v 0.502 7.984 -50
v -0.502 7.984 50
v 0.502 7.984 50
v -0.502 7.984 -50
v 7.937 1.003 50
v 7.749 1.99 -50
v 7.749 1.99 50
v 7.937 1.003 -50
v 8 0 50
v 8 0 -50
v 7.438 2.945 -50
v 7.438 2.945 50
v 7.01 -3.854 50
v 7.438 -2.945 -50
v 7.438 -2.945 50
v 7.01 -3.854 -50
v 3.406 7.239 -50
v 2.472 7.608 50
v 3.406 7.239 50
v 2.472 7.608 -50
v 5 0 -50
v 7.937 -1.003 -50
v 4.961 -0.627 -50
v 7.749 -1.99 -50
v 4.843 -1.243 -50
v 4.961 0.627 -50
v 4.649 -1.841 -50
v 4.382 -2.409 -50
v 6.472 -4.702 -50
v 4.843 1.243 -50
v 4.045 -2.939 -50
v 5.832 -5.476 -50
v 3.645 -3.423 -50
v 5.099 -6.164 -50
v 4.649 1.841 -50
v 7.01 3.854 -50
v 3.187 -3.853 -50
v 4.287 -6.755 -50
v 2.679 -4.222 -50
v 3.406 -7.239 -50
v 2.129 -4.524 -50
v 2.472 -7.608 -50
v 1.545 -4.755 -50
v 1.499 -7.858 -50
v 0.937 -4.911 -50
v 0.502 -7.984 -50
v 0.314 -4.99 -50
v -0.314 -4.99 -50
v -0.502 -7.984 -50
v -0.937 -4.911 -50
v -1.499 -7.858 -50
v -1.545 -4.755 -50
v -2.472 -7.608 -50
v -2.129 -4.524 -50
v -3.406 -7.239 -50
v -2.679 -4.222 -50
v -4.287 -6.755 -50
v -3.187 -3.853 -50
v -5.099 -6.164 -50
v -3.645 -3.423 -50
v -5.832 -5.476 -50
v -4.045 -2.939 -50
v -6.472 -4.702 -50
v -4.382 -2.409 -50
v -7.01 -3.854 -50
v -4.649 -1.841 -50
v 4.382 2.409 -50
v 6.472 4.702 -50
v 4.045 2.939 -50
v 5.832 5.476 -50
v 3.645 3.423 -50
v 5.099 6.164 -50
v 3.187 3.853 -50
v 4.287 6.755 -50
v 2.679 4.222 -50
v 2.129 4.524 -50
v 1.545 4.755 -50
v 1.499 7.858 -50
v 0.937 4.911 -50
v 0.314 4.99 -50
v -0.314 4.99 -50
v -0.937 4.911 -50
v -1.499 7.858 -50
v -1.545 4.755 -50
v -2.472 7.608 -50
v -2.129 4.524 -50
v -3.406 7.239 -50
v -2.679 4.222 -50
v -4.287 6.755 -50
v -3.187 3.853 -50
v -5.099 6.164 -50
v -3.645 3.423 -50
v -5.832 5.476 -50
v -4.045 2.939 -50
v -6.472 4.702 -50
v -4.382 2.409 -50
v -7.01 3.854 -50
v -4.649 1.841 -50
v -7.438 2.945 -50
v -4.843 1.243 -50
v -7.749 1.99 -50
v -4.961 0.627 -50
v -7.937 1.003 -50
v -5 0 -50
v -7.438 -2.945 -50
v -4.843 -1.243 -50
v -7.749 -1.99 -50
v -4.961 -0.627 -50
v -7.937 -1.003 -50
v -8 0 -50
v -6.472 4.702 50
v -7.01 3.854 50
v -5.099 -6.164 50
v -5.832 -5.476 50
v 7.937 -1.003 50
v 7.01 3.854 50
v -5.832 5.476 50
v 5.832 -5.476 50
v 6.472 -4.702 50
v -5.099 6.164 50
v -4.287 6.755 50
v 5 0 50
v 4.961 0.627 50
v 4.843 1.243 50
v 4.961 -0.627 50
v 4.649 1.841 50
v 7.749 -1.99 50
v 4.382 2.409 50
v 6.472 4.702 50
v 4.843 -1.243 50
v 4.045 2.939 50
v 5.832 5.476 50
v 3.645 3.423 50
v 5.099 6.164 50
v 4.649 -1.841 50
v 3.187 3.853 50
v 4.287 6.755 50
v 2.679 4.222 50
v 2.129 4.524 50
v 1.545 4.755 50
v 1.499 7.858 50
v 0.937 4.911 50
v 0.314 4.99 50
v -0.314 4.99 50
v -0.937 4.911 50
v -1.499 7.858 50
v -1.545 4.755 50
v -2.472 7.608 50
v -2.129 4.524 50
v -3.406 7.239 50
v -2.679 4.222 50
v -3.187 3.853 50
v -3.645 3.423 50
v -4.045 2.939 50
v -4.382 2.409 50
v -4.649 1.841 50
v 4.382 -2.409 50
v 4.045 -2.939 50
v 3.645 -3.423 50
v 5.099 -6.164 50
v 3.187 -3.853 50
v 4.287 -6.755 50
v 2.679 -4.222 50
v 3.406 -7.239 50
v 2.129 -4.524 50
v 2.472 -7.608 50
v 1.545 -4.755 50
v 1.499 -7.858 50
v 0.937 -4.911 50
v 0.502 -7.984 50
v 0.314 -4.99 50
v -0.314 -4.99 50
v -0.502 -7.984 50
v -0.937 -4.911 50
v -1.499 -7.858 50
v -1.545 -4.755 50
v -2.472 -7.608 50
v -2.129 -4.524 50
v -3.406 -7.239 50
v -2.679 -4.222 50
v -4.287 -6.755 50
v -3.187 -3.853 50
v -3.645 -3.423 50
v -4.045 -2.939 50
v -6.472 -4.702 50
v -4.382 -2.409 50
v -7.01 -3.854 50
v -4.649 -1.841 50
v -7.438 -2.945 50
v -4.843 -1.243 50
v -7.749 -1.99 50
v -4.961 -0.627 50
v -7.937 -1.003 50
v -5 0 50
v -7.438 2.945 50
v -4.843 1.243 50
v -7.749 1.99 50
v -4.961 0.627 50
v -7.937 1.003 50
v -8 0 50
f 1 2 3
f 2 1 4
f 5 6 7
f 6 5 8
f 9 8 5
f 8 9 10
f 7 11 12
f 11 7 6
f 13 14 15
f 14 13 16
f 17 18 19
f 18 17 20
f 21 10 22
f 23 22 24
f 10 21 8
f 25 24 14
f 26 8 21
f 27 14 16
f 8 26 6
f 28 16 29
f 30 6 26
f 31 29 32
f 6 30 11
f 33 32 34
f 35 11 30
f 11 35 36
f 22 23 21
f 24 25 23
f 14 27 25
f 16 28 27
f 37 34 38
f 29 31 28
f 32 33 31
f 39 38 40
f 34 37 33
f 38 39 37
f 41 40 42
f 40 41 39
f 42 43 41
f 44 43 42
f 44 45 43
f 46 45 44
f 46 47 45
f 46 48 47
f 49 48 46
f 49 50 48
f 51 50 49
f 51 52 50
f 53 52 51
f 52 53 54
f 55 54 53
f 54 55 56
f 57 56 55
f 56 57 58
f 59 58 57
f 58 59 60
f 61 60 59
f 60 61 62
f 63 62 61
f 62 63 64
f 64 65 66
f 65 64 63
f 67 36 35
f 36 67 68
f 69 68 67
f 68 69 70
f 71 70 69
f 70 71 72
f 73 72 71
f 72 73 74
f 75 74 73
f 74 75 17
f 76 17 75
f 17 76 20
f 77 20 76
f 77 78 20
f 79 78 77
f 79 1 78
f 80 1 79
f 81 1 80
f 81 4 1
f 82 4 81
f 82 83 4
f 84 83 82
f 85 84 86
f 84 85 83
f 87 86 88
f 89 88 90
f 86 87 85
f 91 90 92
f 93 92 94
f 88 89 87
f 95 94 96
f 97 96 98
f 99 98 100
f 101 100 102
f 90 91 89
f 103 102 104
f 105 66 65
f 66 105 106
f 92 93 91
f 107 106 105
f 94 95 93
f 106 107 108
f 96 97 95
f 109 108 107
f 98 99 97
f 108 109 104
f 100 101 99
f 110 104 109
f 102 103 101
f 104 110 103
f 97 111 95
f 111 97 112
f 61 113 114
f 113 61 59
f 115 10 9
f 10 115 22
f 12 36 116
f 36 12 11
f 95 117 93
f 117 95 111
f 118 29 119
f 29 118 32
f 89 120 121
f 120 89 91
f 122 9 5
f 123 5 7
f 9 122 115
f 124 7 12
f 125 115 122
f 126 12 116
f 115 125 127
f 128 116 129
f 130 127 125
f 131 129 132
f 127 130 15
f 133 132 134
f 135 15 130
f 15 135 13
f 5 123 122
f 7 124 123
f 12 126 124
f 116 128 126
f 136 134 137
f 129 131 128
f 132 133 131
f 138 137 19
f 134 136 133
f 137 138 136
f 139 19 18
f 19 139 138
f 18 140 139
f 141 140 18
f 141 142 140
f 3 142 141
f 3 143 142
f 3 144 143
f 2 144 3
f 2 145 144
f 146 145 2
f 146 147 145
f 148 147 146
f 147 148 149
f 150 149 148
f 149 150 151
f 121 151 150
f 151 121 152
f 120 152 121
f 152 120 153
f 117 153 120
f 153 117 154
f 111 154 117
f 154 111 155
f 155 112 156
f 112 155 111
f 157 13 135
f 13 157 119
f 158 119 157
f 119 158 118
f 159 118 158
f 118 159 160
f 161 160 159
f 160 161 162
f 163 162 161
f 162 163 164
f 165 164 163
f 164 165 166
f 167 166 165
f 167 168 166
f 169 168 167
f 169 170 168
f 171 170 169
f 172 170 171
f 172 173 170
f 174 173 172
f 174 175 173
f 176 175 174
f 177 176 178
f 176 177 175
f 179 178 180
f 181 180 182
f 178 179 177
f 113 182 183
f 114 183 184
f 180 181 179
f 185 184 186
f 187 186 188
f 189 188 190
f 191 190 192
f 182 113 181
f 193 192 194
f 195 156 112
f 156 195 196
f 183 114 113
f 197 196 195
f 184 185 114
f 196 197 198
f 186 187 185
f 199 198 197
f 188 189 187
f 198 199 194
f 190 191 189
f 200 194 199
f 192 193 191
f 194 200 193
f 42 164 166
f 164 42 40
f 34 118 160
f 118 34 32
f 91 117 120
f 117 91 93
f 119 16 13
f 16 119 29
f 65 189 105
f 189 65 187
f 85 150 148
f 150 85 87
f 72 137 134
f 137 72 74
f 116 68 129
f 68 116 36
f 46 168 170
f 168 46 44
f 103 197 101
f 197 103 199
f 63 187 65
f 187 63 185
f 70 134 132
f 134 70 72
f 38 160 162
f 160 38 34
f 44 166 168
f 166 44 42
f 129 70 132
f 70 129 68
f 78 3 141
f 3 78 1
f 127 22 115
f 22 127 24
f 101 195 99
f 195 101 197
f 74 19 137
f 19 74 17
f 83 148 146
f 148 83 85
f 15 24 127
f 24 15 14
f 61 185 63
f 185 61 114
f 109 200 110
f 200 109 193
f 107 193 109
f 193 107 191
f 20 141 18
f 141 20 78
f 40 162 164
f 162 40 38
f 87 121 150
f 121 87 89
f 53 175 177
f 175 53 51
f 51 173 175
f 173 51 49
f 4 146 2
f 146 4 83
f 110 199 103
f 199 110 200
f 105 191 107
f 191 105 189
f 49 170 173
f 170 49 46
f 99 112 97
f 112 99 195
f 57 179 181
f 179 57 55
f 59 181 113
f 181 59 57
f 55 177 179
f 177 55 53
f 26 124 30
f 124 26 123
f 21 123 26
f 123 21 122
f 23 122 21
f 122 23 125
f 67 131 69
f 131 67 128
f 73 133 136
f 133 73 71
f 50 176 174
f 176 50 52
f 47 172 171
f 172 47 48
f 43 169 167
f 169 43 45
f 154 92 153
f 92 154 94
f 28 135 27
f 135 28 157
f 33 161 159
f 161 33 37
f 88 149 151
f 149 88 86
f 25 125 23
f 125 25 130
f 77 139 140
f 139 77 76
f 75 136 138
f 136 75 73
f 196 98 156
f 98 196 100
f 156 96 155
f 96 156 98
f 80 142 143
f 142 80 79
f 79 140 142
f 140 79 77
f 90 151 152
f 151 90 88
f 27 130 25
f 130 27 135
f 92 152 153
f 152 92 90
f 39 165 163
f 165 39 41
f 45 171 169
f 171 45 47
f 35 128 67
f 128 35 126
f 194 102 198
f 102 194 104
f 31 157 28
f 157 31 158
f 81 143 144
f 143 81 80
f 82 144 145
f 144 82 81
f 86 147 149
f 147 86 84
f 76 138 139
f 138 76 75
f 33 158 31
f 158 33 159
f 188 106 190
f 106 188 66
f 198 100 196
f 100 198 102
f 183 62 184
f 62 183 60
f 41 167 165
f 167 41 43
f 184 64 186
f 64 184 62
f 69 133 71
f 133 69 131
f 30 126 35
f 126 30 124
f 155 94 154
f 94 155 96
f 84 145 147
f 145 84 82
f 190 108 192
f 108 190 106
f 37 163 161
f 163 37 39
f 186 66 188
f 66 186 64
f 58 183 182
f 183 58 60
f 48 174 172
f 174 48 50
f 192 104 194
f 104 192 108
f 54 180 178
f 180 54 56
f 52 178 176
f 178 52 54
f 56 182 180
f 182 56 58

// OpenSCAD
$fn = 50;


difference() {
	union() {
		translate(v = [0, 0, -50.0000000000]) {
			cylinder(h = 100, r = 8.0000000000);
		}
	}
	union() {
		translate(v = [0, 0, -100.0000000000]) {
			cylinder(h = 200, r = 5.0000000000);
		}
	}
}
